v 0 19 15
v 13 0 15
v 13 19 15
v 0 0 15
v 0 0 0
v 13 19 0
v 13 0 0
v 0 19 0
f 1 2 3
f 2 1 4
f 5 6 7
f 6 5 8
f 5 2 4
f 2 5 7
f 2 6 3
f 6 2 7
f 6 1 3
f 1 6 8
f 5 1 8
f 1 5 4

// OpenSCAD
// Generated by SolidPython 1.0.1 on 2020-07-29 00:46:55


cube(size = [13, 19, 15]);
/***********************************************
*********      SolidPython code:      **********
************************************************
 
# import packages: SolidPython
from solid import *
from solid.utils import *
from itertools import chain, combinations, permutations


class Resize:

    def __init__(self, scad_file):
        self.scad_file = scad_file
        #self.scad_file = import_scad(scad_file)
        # cone/cylinder param:
        self.r1 = 0
        self.r2 = 0
        self.h = 0
        # rectangular prism param:
        self.w = 0
        self.l = 0
        # ellipse param:
        self.r = 0

    # import OpenScad code (file name corresponds to shape)


    # classify shape + parameters
    def assign(self, param1, param2, param3):
        if self.scad_file == 'cone.scad':
            self.r1 = param1
            self.r2 = param2
            self.h = param3
        elif self.scad_file == 'cylinder.scad':
            self.r1 = param1
            self.r2 = param2
            self.h = param3
        elif self.scad_file == 'rectangularPrism.scad':
            self.h = param1
            self.l = param2
            self.w = param3
        else:
            self.r = param1
            self.h = param2

    # resize parameters
    def iterate(self):
        x = range(3, 20, 2)
        i = 1
        if self.scad_file == 'cone.scad':
            tempList = list(permutations(x, 2))
            for temp in tempList:
                param1 = temp[0]
                param2 = temp[1]
                filepath = 'produced_scad_files/' + 'cone' + str(param1) + '_' + str(param2) + '_' + '.scad'
                scad_render_to_file(cylinder(h=param1, r1=param2, r2=0), filepath)

        elif self.scad_file == 'cylinder.scad':
            tempList = list(permutations(x, 3))
            for temp in tempList:
                param1 = temp[0]
                param2 = temp[1]
                filepath = 'produced_scad_files/' + 'cylinder' + str(param1) + '_' + str(param2) + '_' + '.scad'
                scad_render_to_file(cylinder(h=param1, r1=param2, r2=param2), filepath)

        elif self.scad_file == 'rectangularPrism.scad':
            tempList = list(permutations(x, 3))
            for temp in tempList:
                param1 = temp[0]
                param2 = temp[1]
                param3 = temp[2]
                filepath = 'produced_scad_files/' + 'rectangularPrism' + str(param1) + '_' + str(param2) + '_' + str(
                    param3) + '.scad'
                scad_render_to_file(cube(size=(param1, param2, param3)), filepath)

        elif self.scad_file == 'ellipse.scad':
            tempList = list(permutations(x, 4))
            for temp in tempList:
                param1 = temp[0]
                param2 = temp[1]
                param3 = temp[2]
                param4 = temp[3]
                filepath = 'produced_scad_files/' + 'ellipse' + str(param1) + '_' + str(param2) + '_' + str(param3) + '_' + str(param4) + '.scad'
                scad_render_to_file(scale([param1, param2, param3])(sphere(r=param4)), filepath)

    def render_to_scadfile(self):
        scad_render_to_file(scad, 'example.scad') 
 
************************************************/
